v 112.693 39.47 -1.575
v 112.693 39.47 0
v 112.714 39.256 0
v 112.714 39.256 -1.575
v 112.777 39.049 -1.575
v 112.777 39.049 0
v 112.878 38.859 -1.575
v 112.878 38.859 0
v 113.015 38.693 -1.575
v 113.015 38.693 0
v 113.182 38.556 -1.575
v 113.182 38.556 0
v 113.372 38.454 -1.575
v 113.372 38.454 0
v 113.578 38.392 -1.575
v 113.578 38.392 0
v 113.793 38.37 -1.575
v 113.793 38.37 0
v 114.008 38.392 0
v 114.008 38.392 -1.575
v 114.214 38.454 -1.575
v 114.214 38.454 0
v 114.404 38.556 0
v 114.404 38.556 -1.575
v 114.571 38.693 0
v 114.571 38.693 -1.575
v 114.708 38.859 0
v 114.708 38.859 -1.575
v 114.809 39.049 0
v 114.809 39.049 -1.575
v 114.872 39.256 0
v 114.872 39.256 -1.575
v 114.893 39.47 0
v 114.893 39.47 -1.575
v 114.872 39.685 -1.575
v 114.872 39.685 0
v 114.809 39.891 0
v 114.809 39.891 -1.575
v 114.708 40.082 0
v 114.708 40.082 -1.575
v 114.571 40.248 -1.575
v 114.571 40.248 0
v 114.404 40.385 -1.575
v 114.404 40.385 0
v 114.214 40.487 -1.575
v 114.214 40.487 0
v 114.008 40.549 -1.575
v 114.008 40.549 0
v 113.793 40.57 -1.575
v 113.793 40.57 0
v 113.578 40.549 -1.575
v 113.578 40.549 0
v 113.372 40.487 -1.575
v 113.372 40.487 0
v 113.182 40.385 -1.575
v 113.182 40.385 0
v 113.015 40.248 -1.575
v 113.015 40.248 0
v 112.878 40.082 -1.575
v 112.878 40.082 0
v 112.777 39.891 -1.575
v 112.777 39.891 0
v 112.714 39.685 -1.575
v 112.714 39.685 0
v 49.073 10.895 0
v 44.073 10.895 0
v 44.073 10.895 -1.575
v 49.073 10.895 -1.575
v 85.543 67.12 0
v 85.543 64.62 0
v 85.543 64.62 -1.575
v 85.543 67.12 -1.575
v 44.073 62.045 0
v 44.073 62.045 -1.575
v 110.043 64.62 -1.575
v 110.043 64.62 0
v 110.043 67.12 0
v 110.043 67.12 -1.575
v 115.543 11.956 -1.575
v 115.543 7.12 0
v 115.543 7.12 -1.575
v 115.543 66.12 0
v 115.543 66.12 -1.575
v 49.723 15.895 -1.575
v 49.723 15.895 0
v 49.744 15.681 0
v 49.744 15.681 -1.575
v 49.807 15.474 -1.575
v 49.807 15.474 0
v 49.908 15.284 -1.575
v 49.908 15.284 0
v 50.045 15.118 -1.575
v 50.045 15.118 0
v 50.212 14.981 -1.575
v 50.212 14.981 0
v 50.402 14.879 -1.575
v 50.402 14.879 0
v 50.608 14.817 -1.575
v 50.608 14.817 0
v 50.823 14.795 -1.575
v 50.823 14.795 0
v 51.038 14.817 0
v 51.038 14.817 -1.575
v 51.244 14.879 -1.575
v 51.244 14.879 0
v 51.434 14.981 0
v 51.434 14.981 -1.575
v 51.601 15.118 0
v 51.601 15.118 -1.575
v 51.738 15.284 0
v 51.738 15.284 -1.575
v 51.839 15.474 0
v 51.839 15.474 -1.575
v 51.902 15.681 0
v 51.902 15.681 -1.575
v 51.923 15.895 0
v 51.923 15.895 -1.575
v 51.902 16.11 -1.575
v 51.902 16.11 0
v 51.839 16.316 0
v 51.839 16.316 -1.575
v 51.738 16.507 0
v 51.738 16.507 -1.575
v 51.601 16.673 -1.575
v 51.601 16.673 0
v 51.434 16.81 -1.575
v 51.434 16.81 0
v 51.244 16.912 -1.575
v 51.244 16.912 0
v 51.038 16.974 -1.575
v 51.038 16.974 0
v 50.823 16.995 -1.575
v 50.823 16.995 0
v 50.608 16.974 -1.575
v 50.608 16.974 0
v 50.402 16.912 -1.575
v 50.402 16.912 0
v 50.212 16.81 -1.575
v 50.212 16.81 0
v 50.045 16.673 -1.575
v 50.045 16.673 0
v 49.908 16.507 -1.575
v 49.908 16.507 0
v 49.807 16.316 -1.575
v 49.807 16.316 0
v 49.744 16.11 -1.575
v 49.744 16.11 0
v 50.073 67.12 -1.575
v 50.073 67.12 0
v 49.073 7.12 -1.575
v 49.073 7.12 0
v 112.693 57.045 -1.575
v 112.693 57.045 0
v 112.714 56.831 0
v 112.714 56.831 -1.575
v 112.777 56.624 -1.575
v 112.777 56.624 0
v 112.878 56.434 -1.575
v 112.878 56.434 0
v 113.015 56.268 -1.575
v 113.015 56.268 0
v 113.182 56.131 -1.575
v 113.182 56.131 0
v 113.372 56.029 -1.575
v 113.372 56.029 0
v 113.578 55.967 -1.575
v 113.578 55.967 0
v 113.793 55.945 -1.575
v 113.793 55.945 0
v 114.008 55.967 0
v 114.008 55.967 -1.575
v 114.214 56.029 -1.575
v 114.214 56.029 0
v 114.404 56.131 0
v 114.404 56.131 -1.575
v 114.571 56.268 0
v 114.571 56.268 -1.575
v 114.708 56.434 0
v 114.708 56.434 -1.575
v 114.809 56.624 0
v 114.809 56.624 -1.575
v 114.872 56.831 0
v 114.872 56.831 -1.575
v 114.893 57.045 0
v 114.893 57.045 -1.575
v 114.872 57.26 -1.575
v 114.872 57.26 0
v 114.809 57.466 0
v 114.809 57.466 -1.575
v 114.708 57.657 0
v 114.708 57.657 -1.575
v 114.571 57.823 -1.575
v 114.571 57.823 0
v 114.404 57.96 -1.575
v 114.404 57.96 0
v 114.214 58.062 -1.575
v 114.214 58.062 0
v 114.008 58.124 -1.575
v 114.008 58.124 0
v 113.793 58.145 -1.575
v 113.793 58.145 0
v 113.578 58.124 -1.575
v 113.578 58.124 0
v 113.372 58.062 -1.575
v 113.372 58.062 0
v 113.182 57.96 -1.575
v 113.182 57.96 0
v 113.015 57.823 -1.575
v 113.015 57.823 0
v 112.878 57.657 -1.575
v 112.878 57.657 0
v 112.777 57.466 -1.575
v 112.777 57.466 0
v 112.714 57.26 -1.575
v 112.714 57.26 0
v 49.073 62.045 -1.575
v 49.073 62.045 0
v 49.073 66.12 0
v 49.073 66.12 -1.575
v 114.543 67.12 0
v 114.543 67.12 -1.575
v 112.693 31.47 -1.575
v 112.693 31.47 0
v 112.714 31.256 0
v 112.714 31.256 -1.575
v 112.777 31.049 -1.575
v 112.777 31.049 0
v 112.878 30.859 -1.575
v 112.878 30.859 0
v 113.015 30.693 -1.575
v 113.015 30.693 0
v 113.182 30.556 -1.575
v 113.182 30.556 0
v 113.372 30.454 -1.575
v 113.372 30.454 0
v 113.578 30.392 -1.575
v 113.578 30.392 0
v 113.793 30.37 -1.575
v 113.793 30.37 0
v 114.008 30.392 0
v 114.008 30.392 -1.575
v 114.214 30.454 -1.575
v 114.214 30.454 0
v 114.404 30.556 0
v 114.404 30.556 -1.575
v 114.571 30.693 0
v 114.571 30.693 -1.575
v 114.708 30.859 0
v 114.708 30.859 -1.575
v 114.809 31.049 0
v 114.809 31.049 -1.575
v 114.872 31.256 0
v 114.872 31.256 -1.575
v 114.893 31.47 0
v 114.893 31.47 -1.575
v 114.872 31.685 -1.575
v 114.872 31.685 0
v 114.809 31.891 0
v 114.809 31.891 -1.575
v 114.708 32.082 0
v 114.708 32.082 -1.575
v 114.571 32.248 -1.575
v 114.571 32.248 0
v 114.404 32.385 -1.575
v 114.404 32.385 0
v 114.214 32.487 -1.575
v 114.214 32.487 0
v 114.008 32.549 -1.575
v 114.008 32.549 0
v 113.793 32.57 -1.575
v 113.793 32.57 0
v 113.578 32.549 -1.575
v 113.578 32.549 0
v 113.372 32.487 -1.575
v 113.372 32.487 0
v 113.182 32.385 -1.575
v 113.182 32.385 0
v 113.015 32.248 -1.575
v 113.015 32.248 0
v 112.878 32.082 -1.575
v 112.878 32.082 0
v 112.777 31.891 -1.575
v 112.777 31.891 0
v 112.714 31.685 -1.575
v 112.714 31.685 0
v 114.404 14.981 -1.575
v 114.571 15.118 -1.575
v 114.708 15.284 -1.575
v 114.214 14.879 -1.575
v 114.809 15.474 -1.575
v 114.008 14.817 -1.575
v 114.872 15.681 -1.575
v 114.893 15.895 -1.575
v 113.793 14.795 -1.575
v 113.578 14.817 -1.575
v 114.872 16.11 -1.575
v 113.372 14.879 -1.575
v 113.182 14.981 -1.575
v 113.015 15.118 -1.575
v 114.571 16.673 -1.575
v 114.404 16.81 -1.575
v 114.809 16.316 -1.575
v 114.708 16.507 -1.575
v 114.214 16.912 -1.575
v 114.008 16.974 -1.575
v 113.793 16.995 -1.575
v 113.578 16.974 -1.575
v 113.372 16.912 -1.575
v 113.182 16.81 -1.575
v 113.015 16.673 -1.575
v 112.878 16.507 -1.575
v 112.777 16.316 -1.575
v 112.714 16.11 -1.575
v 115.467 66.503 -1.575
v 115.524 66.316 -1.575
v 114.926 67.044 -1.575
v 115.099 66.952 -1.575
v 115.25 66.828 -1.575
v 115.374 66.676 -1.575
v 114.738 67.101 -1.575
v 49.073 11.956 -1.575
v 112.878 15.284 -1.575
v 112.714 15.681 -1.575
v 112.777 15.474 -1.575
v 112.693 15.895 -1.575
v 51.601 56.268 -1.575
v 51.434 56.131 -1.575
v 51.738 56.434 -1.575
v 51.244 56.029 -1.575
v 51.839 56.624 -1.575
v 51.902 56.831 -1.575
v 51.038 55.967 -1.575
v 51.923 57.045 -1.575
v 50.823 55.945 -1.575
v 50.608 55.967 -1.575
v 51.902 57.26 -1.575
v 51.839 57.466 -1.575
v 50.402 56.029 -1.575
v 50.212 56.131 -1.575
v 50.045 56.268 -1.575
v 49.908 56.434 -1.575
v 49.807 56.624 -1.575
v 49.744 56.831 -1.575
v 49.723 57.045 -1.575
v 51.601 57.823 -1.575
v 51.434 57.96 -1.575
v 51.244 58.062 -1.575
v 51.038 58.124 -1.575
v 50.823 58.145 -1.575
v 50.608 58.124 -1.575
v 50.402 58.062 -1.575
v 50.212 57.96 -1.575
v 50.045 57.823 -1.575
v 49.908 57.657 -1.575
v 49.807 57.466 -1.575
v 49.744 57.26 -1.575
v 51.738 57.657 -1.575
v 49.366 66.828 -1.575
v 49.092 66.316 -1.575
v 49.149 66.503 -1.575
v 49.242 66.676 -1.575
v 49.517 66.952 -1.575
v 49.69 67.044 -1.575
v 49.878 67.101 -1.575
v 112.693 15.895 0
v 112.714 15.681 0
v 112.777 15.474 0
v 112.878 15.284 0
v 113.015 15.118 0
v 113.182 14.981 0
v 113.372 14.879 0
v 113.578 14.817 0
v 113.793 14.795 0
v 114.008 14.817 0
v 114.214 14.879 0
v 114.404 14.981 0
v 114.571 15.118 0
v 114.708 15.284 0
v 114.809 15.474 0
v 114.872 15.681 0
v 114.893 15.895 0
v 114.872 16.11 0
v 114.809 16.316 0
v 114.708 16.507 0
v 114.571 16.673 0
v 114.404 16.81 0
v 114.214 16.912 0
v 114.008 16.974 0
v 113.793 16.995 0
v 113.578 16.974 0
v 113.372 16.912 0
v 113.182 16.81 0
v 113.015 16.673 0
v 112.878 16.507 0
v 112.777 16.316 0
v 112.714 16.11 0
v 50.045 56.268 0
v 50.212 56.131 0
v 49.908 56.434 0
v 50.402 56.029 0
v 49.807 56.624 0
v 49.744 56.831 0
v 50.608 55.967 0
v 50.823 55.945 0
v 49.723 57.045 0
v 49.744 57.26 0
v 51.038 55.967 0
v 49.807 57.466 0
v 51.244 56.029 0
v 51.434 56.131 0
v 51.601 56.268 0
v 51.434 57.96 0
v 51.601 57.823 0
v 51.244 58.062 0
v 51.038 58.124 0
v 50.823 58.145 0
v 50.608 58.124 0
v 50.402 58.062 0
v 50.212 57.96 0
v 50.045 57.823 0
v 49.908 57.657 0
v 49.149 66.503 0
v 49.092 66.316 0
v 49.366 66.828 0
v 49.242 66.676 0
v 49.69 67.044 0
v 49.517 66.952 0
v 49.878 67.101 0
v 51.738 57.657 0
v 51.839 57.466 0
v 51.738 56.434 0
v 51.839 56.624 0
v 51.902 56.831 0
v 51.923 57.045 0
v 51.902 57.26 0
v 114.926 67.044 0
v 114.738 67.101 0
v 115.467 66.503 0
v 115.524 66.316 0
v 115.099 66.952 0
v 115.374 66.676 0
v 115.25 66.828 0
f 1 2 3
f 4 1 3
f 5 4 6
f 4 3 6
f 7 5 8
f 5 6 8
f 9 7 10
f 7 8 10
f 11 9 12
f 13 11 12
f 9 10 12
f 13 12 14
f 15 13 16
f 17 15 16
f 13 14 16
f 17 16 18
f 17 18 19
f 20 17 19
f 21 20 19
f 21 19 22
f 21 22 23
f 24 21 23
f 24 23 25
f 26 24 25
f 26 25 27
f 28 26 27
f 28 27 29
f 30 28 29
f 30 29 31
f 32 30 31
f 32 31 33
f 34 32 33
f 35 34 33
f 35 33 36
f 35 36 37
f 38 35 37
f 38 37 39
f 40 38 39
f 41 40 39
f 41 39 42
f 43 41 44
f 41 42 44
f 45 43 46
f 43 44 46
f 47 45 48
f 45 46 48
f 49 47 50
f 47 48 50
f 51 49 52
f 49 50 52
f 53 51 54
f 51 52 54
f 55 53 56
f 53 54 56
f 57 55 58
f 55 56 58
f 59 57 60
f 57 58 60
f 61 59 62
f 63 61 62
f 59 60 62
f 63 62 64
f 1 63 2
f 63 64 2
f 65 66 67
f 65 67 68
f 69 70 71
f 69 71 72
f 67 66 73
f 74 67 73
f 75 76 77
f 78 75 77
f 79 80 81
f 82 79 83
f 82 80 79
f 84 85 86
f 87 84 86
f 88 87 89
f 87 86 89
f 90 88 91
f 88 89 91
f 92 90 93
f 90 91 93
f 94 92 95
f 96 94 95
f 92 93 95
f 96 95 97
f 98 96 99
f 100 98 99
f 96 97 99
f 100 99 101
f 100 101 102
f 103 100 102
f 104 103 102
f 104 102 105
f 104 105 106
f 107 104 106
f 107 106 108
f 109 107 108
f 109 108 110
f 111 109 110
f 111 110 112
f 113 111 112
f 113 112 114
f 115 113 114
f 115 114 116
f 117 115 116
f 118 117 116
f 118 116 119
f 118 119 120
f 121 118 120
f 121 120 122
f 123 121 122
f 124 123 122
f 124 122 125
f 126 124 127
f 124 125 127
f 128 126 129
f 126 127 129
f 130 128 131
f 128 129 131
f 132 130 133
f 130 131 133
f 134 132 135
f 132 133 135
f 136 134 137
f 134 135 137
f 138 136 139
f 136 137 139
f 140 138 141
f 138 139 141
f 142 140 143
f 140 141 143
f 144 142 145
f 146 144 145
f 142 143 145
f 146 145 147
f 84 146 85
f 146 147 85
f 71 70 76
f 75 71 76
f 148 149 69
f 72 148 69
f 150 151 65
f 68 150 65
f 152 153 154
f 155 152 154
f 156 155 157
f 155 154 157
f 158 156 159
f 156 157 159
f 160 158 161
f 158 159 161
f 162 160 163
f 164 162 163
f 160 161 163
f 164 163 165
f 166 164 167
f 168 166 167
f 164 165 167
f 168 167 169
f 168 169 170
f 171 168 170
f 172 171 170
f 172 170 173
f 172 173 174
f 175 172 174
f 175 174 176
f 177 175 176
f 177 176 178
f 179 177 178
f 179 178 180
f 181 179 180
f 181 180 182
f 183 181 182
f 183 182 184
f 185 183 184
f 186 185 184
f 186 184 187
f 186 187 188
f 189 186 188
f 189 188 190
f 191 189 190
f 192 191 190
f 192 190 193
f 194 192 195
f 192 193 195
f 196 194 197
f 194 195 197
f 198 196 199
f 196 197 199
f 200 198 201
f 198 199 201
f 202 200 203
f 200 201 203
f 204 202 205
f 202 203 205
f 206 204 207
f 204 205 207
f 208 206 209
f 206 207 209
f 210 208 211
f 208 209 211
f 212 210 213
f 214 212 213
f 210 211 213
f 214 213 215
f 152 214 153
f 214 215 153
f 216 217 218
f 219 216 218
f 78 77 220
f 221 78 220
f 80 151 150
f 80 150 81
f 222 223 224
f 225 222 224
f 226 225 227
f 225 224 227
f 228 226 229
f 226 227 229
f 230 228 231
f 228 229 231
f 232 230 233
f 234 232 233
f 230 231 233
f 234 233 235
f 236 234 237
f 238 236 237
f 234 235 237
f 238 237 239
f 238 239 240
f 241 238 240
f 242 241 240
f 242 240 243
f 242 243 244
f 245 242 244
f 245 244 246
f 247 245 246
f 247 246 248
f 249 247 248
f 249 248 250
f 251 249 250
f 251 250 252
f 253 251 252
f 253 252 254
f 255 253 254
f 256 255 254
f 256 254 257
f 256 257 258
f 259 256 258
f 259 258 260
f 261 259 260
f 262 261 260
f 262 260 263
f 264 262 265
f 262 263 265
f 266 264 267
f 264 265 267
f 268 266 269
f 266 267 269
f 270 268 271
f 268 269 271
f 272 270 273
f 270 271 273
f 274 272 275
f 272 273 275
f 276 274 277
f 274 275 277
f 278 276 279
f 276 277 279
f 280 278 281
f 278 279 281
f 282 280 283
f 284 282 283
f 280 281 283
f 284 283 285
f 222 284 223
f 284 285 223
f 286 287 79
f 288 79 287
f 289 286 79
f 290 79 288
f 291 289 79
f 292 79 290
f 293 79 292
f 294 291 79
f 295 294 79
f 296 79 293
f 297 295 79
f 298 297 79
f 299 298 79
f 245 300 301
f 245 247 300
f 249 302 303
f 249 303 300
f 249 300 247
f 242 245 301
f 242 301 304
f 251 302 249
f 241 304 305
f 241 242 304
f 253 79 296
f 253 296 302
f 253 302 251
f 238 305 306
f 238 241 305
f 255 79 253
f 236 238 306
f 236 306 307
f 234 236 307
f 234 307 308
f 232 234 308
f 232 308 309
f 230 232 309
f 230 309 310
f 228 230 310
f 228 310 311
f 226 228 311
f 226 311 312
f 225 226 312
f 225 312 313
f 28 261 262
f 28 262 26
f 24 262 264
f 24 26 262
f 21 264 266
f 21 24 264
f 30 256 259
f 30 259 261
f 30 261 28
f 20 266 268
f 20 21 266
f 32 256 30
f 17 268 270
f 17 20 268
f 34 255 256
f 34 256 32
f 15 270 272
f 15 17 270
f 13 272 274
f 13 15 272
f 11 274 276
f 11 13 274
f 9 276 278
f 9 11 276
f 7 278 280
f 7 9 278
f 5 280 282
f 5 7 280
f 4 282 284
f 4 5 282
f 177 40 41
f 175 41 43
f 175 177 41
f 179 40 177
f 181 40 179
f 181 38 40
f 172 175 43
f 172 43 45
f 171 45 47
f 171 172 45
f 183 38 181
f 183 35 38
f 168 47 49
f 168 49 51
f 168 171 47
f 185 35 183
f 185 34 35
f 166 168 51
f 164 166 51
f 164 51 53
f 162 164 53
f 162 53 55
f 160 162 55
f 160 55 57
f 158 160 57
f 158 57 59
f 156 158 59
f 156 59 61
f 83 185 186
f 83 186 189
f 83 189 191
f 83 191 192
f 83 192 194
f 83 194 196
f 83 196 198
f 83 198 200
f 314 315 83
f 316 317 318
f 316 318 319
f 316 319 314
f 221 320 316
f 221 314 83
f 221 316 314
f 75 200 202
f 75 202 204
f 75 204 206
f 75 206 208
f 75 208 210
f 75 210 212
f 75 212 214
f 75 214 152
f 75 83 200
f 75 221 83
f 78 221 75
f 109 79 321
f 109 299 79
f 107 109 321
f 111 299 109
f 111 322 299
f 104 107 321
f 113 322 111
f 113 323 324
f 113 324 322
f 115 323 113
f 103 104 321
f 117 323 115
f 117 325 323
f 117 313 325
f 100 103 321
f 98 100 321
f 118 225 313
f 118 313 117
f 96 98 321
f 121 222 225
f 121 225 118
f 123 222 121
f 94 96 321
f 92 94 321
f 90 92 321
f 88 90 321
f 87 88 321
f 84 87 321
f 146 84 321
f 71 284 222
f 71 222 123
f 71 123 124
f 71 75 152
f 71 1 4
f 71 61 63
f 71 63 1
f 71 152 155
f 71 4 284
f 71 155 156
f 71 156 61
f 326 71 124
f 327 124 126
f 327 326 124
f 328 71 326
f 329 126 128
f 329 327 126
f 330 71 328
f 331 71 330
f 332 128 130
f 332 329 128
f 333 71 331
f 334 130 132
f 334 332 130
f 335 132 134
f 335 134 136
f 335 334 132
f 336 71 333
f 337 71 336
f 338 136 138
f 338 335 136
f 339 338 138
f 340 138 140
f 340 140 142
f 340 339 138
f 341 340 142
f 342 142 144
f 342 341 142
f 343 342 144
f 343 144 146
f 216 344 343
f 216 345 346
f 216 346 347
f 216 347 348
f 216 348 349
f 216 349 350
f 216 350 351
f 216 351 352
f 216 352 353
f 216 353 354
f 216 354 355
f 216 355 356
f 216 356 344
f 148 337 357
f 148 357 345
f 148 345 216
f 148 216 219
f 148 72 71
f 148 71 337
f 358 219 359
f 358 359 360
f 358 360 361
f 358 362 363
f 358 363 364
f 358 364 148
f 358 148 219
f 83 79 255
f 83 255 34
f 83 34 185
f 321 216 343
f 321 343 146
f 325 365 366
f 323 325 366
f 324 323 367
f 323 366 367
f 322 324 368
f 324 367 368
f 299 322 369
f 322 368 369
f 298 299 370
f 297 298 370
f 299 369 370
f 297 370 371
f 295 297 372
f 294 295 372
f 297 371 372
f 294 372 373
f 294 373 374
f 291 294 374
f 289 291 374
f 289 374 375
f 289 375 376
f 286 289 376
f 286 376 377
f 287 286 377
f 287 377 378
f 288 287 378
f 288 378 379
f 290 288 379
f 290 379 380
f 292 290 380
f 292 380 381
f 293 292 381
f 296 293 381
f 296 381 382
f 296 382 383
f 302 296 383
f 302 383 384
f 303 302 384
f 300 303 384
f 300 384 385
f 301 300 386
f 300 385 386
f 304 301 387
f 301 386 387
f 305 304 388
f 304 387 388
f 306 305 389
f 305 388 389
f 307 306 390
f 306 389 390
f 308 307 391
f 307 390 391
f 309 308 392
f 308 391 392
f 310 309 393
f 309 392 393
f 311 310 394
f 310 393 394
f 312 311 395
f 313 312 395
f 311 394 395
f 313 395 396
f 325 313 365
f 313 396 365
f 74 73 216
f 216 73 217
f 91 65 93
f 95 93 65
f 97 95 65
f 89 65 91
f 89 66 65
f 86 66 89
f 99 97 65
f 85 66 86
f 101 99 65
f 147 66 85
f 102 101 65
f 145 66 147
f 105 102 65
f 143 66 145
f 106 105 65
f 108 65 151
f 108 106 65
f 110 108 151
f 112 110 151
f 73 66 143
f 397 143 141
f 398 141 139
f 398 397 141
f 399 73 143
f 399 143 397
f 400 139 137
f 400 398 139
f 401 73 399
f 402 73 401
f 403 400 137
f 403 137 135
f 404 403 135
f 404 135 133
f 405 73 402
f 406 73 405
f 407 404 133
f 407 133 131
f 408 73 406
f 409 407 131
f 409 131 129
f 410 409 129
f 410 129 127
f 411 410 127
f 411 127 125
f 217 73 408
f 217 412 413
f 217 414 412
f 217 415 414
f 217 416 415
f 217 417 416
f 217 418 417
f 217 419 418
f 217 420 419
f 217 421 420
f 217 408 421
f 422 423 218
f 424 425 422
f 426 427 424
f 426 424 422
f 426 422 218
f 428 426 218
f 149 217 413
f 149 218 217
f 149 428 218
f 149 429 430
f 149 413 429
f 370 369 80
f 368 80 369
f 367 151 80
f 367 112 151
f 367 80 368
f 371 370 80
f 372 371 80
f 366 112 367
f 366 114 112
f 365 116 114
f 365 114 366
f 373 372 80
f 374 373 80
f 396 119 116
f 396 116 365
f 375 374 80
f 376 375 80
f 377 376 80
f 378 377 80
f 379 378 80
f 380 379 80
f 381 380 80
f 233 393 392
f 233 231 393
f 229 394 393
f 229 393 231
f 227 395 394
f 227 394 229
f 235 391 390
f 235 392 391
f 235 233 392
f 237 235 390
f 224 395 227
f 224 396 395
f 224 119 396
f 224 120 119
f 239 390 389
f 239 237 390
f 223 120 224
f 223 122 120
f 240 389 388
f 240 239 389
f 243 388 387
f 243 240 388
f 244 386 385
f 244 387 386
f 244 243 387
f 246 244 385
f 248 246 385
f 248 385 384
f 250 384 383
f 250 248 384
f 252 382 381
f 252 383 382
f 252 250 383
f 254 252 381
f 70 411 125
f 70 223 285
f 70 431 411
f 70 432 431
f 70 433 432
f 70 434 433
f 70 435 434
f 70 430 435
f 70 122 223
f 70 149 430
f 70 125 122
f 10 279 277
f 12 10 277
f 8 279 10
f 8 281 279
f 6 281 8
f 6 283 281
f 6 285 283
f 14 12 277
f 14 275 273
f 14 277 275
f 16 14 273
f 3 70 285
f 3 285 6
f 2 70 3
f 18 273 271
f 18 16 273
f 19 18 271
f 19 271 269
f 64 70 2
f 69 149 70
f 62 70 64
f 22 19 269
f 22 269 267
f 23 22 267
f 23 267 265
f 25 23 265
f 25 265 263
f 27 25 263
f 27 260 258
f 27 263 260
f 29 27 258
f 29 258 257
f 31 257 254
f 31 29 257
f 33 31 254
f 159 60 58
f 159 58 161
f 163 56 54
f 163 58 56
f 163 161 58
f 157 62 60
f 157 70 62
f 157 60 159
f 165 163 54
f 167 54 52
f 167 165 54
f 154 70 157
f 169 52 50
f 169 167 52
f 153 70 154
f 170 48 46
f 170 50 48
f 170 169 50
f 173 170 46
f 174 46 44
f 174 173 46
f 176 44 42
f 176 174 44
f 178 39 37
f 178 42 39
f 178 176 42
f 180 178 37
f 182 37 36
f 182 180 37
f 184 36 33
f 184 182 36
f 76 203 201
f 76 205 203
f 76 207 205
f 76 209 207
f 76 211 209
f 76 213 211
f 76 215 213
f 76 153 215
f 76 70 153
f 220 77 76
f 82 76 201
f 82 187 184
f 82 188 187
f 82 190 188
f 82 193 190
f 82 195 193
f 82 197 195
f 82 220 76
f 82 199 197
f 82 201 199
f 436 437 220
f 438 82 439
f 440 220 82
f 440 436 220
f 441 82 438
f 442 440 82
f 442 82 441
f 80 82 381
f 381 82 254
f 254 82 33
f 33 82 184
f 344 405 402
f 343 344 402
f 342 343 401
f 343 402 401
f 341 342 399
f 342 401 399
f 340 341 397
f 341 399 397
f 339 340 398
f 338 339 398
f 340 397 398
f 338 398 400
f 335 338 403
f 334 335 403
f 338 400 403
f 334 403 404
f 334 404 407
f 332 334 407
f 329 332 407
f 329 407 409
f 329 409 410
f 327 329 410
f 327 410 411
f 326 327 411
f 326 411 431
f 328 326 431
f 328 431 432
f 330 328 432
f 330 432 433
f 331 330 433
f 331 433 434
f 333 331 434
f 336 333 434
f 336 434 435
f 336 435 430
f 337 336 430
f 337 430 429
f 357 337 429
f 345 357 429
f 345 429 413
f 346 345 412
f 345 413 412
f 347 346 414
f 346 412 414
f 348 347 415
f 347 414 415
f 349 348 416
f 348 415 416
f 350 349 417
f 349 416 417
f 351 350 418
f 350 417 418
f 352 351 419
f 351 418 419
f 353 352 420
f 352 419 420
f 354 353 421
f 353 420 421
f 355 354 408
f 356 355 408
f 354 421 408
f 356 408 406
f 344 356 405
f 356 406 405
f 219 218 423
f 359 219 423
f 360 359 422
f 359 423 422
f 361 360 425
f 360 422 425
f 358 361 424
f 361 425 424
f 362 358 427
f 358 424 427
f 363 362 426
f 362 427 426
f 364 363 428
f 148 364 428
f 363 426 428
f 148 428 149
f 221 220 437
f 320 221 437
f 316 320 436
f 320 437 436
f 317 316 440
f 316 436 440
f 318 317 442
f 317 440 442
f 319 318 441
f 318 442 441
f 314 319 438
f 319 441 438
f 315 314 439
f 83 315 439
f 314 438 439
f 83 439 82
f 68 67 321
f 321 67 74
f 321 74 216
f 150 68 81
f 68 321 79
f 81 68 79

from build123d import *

# Parameters (mm, degrees)
BOSS_EXTRUDE1_DEPTH  = 1.5748
SKETCH3_W            = 66.47
SKETCH3_H            = 5.335951997
BOSS_EXTRUDE2_DEPTH  = 1.575
SKETCH4_W            = 66.47
SKETCH4_H            = 0.5
CUT_EXTRUDE1_DEPTH   = 134.633133513
M2_CLEARANCE_HOLE1_D = 2.2
SKETCH5_W            = 5
SKETCH5_H            = 51.15
BOSS_EXTRUDE3_DEPTH  = 1.575
SKETCH6_W            = 24.5
SKETCH6_H            = 2.5
CUT_EXTRUDE2_DEPTH   = 134.633133513


with BuildPart() as part:
    # BPR2 PCB Outline → Boss-Extrude1 (new body)
    with BuildSketch(Plane.XY):
        with BuildLine():
            Line((114.542984325, 6.620432961), (102.642984325, 6.620432961))
            Line((102.642984325, 6.620432961), (82.642984325, 6.620432961))
            Line((82.642984325, 6.620432961), (49.072984325, 6.620432961))
            Line((49.072984325, 6.620432961), (49.072984325, 66.120432961))
            ThreePointArc((49.072984325, 66.120432961), (49.365877543, 66.827539743), (50.072984325, 67.120432961))
            Line((50.072984325, 67.120432961), (114.542984325, 67.120432961))
            ThreePointArc((114.542984325, 67.120432961), (115.250091106, 66.827539743), (115.542984325, 66.120432961))
            Line((115.542984325, 66.120432961), (115.542984325, 7.620432961))
            ThreePointArc((115.542984325, 7.620432961), (115.250091106, 6.91332618), (114.542984325, 6.620432961))
        make_face()
    extrude(amount=-BOSS_EXTRUDE1_DEPTH)

    # Sketch3 → Boss-Extrude2 (add)
    with BuildSketch(Plane.XY):
        with Locations((82.307984325, 9.288408959)):
            Rectangle(SKETCH3_W, SKETCH3_H)
    extrude(amount=-BOSS_EXTRUDE2_DEPTH)

    # Sketch4 → Cut-Extrude1 (cut, through all)
    with BuildSketch(Plane.XY):
        with Locations((82.307984325, 6.870432961)):
            Rectangle(SKETCH4_W, SKETCH4_H)
    extrude(amount=-CUT_EXTRUDE1_DEPTH, mode=Mode.SUBTRACT)

    # M2 Clearance Hole1 (through all)
    with Locations(Plane(origin=(32.762906477, 104.007481373, -6.5748), x_dir=(1, 0, 0), z_dir=(0, 0, -1))):
        with Locations((18.060077848, 88.112048412), (18.060077848, 46.962048412), (81.030077848, 46.962048412), (81.030077848, 64.537048412), (81.030077848, 88.112048412), (81.030077848, 72.537048412)):
            Hole(M2_CLEARANCE_HOLE1_D / 2)

    # Sketch5 → Boss-Extrude3 (add)
    with BuildSketch(Plane.XY):
        with Locations((46.572984325, 36.470432961)):
            Rectangle(SKETCH5_W, SKETCH5_H)
    extrude(amount=-BOSS_EXTRUDE3_DEPTH)

    # Sketch6 → Cut-Extrude2 (cut, through all)
    with BuildSketch(Plane.XY):
        with Locations((97.792984325, 65.870432961)):
            Rectangle(SKETCH6_W, SKETCH6_H)
    extrude(amount=-CUT_EXTRUDE2_DEPTH, mode=Mode.SUBTRACT)


solid = part.part
